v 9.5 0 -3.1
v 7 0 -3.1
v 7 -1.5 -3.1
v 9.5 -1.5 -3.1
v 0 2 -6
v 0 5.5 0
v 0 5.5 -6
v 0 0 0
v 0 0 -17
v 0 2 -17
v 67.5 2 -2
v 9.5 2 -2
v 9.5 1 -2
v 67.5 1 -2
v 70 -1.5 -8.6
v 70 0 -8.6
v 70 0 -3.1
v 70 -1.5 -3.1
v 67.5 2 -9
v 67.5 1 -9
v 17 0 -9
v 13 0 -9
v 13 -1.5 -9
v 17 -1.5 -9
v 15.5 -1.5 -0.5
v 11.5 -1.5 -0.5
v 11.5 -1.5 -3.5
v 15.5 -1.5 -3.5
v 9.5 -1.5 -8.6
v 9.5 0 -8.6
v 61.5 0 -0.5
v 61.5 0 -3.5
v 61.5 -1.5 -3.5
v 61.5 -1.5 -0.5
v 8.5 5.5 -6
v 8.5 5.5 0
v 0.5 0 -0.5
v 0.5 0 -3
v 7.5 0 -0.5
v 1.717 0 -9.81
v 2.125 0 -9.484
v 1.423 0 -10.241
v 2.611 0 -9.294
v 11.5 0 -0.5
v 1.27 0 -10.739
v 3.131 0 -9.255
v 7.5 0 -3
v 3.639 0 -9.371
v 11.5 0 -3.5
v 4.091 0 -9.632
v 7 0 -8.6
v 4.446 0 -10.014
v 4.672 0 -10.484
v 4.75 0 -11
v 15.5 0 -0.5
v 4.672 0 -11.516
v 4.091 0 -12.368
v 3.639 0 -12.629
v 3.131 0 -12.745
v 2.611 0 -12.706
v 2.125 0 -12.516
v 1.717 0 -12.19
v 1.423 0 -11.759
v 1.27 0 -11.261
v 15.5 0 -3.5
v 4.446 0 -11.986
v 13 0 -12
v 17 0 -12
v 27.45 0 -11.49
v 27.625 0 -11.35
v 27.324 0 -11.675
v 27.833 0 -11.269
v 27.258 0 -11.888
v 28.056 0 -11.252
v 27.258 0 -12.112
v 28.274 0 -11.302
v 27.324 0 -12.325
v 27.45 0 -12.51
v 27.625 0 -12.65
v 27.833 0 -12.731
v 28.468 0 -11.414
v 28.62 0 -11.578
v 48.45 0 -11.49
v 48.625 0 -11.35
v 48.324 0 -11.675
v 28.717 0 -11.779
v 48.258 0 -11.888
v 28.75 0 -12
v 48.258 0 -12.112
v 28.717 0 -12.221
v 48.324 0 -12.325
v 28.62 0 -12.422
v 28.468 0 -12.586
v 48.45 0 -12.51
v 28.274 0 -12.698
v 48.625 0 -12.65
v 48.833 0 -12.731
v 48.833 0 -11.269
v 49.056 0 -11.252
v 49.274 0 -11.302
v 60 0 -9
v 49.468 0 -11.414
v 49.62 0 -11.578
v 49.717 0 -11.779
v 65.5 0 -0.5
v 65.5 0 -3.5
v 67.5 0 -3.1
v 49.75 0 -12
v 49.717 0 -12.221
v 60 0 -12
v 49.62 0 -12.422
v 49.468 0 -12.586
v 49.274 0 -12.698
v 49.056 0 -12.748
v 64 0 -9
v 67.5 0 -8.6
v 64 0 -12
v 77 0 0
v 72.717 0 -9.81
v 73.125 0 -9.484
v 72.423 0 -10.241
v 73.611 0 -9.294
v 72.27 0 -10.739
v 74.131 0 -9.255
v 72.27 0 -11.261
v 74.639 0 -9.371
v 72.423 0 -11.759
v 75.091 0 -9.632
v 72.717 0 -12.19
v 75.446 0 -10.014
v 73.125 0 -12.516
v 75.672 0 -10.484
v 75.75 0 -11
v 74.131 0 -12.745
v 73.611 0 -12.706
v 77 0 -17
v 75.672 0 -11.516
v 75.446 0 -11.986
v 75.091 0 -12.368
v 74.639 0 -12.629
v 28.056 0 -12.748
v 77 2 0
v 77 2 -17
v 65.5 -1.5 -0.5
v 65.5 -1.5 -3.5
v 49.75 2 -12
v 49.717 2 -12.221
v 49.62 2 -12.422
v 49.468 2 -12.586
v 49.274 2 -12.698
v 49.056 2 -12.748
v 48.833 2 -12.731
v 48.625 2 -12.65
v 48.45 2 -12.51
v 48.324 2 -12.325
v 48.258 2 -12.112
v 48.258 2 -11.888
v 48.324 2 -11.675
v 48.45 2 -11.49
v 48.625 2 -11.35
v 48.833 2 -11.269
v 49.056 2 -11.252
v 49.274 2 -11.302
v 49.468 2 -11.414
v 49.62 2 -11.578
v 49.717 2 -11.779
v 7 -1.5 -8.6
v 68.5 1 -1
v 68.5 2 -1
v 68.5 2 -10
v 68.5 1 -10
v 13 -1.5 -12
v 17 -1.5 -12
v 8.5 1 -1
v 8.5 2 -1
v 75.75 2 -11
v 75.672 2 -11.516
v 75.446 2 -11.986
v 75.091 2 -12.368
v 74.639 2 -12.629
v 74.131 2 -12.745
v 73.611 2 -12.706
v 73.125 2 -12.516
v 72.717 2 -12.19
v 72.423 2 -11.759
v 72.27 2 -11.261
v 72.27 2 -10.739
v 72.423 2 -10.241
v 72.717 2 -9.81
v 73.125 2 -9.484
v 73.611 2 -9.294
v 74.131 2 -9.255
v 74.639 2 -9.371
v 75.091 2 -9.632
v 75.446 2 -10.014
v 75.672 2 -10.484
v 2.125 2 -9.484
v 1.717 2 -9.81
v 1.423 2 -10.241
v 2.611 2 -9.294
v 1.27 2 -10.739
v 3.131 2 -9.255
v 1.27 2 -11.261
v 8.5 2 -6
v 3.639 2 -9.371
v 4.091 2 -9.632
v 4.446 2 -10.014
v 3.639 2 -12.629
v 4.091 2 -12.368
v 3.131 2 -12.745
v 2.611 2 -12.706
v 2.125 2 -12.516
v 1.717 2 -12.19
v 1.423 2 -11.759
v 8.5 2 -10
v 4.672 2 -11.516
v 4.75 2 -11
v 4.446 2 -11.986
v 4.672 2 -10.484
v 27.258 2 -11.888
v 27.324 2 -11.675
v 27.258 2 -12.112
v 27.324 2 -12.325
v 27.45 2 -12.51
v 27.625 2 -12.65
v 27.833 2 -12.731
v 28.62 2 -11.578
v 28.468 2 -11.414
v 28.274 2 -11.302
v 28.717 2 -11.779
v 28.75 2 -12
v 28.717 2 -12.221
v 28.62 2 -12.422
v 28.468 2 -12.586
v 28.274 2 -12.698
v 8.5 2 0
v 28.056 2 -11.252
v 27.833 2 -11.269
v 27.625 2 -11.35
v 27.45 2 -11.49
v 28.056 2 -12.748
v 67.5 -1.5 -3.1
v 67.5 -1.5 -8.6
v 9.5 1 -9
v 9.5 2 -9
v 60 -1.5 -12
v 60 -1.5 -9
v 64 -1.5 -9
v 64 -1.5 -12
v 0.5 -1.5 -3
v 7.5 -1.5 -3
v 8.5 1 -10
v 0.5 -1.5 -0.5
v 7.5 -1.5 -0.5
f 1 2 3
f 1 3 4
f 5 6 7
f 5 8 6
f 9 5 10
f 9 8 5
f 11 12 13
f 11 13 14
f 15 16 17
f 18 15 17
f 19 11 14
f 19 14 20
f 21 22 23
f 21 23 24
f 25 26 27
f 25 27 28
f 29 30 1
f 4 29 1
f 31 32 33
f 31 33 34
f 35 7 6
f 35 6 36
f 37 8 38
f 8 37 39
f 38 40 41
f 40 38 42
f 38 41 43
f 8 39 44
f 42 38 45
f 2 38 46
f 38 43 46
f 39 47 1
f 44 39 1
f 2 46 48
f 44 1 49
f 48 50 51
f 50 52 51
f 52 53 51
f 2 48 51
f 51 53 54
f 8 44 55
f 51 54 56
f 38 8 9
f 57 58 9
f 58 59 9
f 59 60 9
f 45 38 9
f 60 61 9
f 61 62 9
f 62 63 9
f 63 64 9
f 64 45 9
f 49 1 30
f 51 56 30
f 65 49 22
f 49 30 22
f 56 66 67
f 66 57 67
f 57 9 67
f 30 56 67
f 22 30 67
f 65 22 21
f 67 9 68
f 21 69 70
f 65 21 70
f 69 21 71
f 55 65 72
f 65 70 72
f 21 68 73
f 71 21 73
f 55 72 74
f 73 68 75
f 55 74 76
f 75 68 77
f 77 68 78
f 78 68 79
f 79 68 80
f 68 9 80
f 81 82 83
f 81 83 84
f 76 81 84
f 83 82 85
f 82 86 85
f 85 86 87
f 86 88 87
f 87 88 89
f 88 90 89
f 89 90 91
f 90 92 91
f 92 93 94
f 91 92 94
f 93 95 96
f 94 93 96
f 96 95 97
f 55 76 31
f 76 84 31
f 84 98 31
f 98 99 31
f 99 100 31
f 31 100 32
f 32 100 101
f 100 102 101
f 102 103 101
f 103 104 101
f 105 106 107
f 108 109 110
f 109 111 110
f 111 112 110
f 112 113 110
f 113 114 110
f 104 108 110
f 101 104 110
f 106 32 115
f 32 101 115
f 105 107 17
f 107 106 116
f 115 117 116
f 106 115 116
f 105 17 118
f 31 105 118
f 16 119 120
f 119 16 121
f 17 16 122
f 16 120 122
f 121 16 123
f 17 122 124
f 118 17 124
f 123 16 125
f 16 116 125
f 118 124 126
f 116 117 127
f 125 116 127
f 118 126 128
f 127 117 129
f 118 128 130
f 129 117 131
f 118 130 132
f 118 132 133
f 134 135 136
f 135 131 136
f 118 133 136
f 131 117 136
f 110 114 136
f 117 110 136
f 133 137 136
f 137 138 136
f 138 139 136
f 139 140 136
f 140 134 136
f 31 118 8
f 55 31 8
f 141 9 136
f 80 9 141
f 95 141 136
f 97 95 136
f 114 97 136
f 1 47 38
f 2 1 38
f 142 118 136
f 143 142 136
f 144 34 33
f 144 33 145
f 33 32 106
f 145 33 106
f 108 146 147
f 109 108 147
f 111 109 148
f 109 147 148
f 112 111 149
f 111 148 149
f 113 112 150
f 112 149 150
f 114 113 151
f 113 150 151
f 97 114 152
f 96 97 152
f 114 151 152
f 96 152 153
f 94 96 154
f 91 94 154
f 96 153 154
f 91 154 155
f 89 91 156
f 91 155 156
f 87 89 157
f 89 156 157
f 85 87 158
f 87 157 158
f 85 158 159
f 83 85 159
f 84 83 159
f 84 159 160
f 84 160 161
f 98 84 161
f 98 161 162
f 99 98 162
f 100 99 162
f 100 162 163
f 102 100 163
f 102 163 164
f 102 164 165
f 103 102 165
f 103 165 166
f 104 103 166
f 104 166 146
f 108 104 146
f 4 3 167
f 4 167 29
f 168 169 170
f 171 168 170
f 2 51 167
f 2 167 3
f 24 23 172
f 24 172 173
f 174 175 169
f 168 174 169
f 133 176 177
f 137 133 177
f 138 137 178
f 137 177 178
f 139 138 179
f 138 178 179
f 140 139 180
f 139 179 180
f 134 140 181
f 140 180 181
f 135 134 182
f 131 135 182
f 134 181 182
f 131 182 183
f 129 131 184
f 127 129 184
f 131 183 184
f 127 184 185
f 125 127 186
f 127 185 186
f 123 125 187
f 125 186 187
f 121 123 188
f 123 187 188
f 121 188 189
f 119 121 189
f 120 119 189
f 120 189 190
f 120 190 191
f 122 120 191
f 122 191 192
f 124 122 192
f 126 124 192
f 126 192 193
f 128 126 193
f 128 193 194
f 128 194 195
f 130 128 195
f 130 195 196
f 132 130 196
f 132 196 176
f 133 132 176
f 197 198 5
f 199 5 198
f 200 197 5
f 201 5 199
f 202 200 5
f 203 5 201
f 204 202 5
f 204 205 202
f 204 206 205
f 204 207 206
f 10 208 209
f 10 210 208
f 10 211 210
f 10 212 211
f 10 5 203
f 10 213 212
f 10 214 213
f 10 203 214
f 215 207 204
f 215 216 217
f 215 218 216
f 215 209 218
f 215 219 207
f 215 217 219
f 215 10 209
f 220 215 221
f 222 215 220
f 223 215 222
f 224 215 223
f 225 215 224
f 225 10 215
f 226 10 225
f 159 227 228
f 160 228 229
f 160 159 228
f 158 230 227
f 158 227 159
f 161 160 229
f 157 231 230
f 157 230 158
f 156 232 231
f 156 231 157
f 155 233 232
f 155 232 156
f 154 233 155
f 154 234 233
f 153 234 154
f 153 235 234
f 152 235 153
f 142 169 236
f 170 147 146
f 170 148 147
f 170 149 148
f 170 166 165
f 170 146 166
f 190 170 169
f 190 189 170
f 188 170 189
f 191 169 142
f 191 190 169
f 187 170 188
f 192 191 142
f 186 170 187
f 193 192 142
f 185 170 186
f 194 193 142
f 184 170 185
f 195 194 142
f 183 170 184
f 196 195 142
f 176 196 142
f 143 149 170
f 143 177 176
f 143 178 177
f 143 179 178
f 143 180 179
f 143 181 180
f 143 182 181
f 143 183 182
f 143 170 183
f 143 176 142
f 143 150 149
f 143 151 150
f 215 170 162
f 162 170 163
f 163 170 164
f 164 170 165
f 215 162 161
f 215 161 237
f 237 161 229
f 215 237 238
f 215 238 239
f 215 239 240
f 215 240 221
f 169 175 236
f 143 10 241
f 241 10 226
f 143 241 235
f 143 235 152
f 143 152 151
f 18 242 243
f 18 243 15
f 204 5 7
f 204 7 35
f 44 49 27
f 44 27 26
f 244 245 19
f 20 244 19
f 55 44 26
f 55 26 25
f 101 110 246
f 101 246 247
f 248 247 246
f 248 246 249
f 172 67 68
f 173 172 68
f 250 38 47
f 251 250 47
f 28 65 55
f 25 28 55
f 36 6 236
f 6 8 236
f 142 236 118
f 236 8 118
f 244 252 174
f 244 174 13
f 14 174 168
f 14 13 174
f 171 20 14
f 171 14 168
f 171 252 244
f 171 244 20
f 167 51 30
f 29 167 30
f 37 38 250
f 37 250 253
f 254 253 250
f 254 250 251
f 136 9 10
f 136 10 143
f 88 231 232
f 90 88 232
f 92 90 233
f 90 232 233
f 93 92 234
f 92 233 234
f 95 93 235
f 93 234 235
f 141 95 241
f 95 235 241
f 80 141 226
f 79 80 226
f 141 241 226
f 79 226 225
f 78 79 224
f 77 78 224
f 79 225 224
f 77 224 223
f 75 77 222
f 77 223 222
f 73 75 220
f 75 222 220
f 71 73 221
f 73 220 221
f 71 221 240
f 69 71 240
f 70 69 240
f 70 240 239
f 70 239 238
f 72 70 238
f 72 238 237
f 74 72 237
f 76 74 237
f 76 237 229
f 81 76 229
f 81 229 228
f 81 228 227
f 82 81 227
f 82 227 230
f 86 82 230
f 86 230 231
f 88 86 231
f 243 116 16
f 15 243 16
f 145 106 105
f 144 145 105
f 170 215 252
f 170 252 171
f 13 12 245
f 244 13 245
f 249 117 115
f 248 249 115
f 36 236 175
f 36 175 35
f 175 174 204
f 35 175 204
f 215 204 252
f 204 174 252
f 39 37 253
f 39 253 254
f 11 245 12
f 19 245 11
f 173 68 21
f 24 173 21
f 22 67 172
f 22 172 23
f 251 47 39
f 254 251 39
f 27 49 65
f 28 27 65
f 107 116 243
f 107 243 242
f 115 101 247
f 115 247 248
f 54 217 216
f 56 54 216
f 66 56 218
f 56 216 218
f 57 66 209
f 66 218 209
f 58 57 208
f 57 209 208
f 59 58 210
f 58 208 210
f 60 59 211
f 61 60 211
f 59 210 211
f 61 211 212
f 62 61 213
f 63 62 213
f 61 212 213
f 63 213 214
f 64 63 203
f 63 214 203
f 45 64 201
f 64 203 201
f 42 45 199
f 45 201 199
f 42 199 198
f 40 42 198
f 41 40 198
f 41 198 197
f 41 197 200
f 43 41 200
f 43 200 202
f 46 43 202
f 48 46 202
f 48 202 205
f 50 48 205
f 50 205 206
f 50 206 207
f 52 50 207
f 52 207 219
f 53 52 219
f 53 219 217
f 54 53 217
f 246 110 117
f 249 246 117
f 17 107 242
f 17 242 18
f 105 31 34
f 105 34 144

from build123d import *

# Parameters (mm, degrees)
ESQUISSE1_W             = 77
ESQUISSE1_H             = 17
BOSS_EXTRU_1_DEPTH      = 2
ESQUISSE2_W             = 60
ESQUISSE2_H             = 9
ESQUISSE2_W_2           = 58
ESQUISSE2_H_2           = 7
ENL_V_MAT_EXTRU_1_DEPTH = 1
ESQUISSE3_W             = 8.5
ESQUISSE3_H             = 6
BOSS_EXTRU_2_DEPTH      = 3.5
ESQUISSE4_R             = 1.75
ESQUISSE4_R_2           = 0.75
ENL_V_MAT_EXTRU_2_DEPTH = 3
ESQUISSE5_W             = 7
ESQUISSE5_H             = 2.5
ESQUISSE5_W_2           = 2.5
ESQUISSE5_H_2           = 5.5
ESQUISSE5_W_3           = 4
ESQUISSE5_H_3           = 3
BOSS_EXTRU_3_DEPTH      = 1.5


with BuildPart() as part:
    # Esquisse1 → Boss.-Extru.1 (new body)
    with BuildSketch(Plane(origin=(0, 0, 0), x_dir=(1, 0, 0), z_dir=(0, 1, 0))):
        with Locations((38.5, 8.5)):
            Rectangle(ESQUISSE1_W, ESQUISSE1_H)
    extrude(amount=BOSS_EXTRU_1_DEPTH)

    # Esquisse2 → Enlèv. mat.-Extru.1 (cut)
    with BuildSketch(Plane(origin=(0, 2, 0), x_dir=(1, 0, 0), z_dir=(0, 1, 0))):
        with Locations((38.5, 5.5)):
            Rectangle(ESQUISSE2_W, ESQUISSE2_H)
        with Locations((38.5, 5.5)):
            Rectangle(ESQUISSE2_W_2, ESQUISSE2_H_2, mode=Mode.SUBTRACT)
    extrude(amount=-ENL_V_MAT_EXTRU_1_DEPTH, mode=Mode.SUBTRACT)

    # Esquisse3 → Boss.-Extru.2 (add)
    with BuildSketch(Plane(origin=(0, 2, 0), x_dir=(1, 0, 0), z_dir=(0, 1, 0))):
        with Locations((4.25, 3)):
            Rectangle(ESQUISSE3_W, ESQUISSE3_H)
    extrude(amount=BOSS_EXTRU_2_DEPTH)

    # Esquisse4 → Enlèv. mat.-Extru.2 (cut, through all)
    with BuildSketch(Plane(origin=(0, 2, 0), x_dir=(1, 0, 0), z_dir=(0, 1, 0))):
        with Locations((74, 11)):
            Circle(ESQUISSE4_R)
        with Locations((49, 12)):
            Circle(ESQUISSE4_R_2)
        with Locations((3, 11)):
            Circle(ESQUISSE4_R)
        with Locations((28, 12)):
            Circle(ESQUISSE4_R_2)
    extrude(amount=-ENL_V_MAT_EXTRU_2_DEPTH, mode=Mode.SUBTRACT)

    # Esquisse5 → Boss.-Extru.3 (add)
    with BuildSketch(Plane.XZ):
        with Locations((4, -1.75)):
            Rectangle(ESQUISSE5_W, ESQUISSE5_H)
        with Locations((8.25, -5.85)):
            Rectangle(ESQUISSE5_W_2, ESQUISSE5_H_2)
        with Locations((15, -10.5)):
            Rectangle(ESQUISSE5_W_3, ESQUISSE5_H_3)
        with Locations((13.5, -2)):
            Rectangle(ESQUISSE5_W_3, ESQUISSE5_H_3)
        with Locations((68.75, -5.85)):
            Rectangle(ESQUISSE5_W_2, ESQUISSE5_H_2)
        with Locations((62, -10.5)):
            Rectangle(ESQUISSE5_W_3, ESQUISSE5_H_3)
        with Locations((63.5, -2)):
            Rectangle(ESQUISSE5_W_3, ESQUISSE5_H_3)
    extrude(amount=BOSS_EXTRU_3_DEPTH)


solid = part.part
